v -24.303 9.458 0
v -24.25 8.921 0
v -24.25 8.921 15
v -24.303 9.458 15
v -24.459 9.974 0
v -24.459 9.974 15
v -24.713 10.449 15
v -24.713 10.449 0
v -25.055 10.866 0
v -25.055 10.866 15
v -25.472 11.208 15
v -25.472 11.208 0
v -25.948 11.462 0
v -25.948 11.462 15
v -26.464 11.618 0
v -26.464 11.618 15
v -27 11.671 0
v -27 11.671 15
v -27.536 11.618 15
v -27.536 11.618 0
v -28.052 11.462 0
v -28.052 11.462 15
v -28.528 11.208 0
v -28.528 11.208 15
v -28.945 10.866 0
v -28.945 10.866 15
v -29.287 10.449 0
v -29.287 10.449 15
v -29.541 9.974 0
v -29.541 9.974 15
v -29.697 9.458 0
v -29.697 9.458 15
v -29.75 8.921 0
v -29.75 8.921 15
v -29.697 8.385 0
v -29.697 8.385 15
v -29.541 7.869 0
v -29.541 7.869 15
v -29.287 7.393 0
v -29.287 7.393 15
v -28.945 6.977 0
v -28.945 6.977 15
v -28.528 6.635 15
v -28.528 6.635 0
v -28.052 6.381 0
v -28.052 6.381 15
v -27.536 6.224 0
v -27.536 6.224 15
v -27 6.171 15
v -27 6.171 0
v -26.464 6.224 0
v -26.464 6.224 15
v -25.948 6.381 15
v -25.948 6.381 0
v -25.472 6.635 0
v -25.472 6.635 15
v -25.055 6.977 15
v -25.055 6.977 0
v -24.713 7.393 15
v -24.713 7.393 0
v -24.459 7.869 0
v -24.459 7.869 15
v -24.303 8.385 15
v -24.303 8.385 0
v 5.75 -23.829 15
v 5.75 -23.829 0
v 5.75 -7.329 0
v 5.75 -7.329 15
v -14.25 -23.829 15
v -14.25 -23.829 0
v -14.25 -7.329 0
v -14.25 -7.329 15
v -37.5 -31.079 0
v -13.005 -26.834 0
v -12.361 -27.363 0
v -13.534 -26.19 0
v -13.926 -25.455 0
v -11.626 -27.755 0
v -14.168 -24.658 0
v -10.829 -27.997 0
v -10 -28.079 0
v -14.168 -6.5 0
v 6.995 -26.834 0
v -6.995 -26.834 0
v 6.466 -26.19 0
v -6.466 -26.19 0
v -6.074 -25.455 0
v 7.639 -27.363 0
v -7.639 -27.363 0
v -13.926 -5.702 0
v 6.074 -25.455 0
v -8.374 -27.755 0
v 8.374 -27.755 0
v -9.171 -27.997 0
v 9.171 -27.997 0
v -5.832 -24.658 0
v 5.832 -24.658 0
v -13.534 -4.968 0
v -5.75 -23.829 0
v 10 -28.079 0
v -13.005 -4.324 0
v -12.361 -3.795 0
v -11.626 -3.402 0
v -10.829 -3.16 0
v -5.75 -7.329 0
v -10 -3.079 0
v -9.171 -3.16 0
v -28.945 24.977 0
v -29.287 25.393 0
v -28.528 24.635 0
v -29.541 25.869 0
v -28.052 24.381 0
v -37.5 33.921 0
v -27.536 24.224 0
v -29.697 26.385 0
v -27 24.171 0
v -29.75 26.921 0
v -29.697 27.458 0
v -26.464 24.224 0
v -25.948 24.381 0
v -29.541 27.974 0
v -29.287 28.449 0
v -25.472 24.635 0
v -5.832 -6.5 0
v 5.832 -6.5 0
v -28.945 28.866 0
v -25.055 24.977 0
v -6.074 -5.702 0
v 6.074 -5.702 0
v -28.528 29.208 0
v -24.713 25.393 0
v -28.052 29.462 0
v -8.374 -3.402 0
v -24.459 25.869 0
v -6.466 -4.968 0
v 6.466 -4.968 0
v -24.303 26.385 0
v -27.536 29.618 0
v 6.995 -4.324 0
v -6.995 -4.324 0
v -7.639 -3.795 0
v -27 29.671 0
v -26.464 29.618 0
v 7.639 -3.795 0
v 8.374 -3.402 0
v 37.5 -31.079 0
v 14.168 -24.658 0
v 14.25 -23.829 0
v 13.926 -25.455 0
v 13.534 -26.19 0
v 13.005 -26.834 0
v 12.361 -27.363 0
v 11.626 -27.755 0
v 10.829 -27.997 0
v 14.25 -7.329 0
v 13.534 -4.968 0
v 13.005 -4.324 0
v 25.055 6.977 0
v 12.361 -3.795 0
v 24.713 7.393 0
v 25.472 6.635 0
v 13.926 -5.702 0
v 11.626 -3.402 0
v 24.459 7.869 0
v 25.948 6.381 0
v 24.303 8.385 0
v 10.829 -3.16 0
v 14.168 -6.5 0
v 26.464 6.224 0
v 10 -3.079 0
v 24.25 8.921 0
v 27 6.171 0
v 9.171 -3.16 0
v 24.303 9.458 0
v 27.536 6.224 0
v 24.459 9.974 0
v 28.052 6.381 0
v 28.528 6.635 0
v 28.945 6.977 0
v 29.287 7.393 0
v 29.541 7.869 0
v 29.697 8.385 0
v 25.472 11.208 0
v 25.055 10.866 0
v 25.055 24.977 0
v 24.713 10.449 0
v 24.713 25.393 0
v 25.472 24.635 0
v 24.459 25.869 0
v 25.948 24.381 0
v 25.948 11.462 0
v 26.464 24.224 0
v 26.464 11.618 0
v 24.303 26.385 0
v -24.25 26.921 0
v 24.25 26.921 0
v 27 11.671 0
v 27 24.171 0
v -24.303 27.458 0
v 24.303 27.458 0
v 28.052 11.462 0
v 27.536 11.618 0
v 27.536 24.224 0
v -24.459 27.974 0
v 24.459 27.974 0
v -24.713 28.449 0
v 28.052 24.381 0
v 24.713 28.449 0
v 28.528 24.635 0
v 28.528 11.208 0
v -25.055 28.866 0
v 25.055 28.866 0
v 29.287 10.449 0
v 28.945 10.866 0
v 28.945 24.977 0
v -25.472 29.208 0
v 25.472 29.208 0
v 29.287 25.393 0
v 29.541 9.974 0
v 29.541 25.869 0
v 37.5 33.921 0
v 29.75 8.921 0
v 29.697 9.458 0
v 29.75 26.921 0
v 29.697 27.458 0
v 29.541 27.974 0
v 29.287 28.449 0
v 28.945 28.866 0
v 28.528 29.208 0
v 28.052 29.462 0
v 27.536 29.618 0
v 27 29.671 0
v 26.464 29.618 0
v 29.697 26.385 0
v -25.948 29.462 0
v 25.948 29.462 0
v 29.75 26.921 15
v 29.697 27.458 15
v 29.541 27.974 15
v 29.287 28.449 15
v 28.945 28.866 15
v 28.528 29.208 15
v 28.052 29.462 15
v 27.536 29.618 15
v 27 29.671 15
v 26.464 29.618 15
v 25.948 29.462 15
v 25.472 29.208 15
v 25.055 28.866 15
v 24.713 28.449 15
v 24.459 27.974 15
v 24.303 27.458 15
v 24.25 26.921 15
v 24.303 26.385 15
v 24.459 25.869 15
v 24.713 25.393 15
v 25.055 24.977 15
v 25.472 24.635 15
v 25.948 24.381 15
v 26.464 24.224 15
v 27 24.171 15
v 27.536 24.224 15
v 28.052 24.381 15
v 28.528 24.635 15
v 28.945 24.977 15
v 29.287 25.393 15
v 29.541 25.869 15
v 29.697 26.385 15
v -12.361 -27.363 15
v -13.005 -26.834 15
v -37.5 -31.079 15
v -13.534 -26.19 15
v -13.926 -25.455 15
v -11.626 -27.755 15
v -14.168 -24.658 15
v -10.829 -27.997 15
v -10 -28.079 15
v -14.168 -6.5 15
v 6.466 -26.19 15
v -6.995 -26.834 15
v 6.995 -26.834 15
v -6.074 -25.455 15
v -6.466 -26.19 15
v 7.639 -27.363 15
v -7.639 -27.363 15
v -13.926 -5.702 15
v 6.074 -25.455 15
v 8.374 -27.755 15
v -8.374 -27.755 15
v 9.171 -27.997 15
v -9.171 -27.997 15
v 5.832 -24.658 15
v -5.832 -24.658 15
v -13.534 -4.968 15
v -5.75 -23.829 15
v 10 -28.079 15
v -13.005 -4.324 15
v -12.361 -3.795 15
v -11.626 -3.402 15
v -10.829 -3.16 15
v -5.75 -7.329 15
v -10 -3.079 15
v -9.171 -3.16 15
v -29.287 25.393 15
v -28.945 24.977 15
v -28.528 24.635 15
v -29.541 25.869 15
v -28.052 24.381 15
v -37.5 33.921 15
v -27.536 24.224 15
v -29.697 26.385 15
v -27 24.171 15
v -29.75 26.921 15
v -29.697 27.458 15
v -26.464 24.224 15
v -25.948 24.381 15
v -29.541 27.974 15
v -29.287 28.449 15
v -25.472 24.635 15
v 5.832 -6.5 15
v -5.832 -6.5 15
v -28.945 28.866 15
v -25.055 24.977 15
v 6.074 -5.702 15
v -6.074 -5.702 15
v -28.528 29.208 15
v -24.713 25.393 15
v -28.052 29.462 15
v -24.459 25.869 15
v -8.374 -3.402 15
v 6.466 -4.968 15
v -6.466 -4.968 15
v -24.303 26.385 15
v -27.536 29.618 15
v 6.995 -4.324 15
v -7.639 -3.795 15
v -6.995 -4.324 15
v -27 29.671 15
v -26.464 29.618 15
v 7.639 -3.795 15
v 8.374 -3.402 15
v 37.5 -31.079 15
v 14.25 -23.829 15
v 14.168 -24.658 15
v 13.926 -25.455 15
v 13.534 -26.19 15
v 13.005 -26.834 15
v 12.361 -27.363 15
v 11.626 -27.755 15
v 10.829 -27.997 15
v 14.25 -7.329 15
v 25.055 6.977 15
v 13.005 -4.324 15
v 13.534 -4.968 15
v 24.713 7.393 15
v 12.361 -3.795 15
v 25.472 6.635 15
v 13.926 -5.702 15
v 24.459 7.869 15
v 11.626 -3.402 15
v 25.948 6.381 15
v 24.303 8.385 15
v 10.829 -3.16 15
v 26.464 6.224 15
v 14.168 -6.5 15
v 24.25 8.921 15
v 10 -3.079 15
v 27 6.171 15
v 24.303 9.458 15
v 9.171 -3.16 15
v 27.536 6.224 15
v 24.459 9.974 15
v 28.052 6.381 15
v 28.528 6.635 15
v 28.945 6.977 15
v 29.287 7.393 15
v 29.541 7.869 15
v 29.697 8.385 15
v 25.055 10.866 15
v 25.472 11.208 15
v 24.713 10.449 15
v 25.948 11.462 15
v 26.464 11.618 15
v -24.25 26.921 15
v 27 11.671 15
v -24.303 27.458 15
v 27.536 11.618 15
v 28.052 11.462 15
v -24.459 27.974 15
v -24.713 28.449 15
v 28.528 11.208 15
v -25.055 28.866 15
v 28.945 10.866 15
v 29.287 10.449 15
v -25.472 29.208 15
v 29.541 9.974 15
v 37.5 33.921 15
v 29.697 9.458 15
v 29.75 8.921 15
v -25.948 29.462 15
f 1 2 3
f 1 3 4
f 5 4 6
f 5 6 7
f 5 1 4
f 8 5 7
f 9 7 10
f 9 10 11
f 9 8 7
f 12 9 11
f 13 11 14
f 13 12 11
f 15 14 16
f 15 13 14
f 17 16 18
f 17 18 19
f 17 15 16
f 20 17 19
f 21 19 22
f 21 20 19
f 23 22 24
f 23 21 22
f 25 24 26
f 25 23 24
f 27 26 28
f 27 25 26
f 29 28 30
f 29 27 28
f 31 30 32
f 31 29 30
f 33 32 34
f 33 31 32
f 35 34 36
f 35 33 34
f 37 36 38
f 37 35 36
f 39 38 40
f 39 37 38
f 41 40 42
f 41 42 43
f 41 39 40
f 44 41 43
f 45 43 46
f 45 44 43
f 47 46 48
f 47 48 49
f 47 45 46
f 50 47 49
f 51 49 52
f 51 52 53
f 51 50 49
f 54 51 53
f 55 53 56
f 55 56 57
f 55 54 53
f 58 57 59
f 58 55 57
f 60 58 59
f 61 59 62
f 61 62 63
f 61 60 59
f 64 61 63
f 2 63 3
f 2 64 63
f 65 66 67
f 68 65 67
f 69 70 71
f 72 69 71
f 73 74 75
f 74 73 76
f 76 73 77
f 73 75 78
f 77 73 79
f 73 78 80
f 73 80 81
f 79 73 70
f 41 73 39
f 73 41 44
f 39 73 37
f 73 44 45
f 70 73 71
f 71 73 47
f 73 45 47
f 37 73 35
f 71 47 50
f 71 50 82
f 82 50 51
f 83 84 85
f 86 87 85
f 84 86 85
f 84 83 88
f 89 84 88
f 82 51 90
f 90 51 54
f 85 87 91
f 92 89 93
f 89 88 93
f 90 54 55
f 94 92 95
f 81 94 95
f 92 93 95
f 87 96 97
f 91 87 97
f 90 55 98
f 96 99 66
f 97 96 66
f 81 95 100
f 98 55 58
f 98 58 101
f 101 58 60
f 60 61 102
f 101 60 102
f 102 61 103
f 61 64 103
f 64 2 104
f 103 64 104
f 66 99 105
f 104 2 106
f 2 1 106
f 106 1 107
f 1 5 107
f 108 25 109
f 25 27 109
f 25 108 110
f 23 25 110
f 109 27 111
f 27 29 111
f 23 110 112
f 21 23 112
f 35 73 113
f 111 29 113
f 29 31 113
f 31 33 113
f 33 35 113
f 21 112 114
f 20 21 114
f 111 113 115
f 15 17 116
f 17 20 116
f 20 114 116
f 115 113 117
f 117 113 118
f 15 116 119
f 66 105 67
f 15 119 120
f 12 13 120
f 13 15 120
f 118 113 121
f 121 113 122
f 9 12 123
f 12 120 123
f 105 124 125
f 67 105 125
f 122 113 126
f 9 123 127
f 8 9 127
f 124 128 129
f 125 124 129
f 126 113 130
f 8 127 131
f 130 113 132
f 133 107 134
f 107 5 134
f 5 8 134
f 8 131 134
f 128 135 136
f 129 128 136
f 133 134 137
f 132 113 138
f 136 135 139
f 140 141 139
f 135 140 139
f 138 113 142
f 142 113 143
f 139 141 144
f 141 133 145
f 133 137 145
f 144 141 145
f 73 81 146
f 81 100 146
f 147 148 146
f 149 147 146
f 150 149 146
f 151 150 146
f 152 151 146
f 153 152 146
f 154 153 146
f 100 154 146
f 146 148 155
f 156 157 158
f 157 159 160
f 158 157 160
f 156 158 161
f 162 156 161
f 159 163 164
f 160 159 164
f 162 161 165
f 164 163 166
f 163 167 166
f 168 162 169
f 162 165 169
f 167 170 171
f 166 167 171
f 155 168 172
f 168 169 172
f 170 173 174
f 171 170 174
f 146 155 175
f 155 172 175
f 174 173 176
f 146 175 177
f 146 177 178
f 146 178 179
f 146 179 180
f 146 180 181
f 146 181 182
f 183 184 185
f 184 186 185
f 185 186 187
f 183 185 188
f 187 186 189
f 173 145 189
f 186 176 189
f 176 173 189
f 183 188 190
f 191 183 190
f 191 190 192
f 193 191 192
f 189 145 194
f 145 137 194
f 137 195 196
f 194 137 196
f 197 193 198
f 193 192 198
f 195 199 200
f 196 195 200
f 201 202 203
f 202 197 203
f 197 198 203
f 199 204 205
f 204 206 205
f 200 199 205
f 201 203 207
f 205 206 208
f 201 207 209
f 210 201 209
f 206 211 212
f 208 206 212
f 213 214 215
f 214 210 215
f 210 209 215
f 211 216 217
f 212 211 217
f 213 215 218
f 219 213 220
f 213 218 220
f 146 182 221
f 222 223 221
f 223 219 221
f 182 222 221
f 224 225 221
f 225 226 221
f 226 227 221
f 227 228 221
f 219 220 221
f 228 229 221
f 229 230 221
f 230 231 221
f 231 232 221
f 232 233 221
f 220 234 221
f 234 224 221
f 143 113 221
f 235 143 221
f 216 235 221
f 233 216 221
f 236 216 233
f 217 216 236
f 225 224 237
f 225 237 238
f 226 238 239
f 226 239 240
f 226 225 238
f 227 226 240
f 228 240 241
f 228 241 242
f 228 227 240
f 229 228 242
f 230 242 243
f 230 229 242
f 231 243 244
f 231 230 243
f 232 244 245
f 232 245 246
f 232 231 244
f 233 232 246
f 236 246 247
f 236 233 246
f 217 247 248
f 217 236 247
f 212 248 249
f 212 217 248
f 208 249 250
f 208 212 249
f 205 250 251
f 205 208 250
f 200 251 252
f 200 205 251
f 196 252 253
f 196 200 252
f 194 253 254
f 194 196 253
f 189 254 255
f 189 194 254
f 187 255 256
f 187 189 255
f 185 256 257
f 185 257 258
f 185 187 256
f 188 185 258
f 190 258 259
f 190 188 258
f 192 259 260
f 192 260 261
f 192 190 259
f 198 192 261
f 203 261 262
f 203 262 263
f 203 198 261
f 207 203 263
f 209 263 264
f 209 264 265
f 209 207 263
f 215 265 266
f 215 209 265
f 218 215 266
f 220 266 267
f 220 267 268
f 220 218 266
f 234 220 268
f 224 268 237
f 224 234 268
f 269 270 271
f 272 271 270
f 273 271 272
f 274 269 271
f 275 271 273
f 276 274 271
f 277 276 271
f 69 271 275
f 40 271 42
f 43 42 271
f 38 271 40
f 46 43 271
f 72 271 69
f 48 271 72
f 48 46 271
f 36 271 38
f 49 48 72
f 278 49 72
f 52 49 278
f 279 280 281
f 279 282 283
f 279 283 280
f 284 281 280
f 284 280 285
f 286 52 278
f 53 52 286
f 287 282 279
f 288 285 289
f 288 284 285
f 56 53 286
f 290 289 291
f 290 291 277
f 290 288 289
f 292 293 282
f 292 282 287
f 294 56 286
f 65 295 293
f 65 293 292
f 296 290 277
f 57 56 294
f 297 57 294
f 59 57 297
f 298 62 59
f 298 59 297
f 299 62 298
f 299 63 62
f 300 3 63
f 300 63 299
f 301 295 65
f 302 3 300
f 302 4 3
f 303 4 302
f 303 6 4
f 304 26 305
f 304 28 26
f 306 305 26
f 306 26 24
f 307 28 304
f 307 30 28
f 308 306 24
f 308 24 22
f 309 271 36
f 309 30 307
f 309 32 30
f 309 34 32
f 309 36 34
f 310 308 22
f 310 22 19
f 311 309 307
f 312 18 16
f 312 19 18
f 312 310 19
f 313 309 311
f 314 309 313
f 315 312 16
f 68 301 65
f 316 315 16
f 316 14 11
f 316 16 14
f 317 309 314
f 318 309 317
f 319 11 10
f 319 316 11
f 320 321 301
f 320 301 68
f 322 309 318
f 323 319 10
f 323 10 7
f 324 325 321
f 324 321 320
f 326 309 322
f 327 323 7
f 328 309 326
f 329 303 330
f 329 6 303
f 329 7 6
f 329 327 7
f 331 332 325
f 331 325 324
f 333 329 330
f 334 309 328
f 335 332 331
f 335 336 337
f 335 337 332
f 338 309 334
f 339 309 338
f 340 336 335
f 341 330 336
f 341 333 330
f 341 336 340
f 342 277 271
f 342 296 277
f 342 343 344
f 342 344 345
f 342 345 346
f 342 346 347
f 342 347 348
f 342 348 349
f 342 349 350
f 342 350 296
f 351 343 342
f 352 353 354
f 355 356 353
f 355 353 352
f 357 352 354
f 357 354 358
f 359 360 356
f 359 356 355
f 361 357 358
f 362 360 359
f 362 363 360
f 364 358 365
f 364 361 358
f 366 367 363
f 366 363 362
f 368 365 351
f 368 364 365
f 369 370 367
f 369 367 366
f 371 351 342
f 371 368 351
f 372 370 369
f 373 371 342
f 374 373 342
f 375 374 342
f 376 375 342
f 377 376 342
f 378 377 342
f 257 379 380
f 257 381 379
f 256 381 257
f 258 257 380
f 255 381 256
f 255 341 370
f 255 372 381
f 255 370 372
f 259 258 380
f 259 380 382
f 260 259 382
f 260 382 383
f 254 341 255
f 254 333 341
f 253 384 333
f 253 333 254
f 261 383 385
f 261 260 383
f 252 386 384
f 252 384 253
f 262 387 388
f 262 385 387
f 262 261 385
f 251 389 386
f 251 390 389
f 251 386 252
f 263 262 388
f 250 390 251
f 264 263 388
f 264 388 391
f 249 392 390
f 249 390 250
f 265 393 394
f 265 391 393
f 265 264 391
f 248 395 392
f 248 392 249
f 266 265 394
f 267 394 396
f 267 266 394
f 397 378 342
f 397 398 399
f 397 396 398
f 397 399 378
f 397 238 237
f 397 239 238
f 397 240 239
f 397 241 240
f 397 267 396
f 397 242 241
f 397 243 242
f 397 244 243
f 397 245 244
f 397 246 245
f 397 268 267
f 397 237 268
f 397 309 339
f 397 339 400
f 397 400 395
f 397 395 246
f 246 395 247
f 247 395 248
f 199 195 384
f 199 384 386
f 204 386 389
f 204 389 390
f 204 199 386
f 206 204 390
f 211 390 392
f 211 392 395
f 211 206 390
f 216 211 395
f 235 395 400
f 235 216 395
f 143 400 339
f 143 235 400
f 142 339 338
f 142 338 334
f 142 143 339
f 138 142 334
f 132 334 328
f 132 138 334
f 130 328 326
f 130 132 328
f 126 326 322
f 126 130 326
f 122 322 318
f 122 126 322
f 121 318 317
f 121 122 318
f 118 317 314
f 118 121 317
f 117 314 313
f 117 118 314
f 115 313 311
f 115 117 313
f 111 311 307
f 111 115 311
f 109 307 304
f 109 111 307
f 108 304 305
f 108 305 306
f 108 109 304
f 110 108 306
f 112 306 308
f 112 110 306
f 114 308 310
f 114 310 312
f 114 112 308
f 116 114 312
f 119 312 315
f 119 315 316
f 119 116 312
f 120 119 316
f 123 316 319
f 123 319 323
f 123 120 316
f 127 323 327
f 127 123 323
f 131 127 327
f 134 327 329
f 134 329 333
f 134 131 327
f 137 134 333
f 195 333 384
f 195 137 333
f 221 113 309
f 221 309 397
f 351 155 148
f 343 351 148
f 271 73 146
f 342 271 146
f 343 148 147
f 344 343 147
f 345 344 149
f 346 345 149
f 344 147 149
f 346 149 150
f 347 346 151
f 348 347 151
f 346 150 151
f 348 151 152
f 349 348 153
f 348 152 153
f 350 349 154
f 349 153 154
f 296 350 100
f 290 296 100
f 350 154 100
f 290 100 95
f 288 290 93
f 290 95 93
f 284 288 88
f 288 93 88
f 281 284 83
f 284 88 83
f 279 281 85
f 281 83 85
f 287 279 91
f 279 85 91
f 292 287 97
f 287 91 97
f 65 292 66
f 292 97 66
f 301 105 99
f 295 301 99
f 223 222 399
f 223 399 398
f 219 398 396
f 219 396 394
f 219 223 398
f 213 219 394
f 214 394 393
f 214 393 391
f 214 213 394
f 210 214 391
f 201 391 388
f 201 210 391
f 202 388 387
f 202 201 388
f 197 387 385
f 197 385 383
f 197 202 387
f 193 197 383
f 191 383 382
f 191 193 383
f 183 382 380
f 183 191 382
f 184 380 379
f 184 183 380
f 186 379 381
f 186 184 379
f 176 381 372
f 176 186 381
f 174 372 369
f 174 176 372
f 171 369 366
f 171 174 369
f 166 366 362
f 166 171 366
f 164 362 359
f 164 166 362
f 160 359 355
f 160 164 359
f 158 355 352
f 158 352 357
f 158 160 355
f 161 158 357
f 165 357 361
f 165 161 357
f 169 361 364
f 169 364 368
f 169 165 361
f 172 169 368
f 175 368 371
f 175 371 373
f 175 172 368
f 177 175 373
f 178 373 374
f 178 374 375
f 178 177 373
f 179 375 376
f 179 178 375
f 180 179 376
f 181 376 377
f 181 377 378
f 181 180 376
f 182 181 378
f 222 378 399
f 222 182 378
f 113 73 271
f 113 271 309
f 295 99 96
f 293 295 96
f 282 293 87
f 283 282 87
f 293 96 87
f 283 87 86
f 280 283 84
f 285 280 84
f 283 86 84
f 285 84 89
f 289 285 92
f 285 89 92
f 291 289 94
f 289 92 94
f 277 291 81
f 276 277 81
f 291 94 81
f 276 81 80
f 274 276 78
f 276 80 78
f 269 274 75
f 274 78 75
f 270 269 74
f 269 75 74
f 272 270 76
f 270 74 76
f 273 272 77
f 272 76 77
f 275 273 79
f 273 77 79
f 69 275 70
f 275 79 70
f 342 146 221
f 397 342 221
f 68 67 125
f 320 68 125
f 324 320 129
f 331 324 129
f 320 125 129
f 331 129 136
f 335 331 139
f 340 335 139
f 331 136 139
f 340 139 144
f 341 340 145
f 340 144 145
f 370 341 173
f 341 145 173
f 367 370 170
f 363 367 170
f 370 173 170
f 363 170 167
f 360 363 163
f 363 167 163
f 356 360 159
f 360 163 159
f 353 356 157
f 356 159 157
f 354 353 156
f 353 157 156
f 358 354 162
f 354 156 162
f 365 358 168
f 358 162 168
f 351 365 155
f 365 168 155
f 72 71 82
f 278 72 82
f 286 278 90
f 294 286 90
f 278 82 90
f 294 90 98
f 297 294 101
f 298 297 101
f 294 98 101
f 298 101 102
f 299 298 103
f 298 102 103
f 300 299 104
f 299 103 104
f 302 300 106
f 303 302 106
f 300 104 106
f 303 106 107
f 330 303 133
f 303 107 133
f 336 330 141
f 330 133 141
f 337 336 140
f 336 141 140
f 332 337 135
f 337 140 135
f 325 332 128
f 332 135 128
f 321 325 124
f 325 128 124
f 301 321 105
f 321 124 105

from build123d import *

# Parameters (mm, degrees)
SKETCH1_W           = 75
SKETCH1_H           = 65
SKETCH1_R           = 2.75
BOSS_EXTRUDE1_DEPTH = 15


with BuildPart() as part:
    # Sketch1 → Boss-Extrude1 (new body)
    with BuildSketch(Plane.XY):
        with Locations((0, 1.421243981)):
            Rectangle(SKETCH1_W, SKETCH1_H)
        with Locations((-27, 8.921243981)):
            Circle(SKETCH1_R, mode=Mode.SUBTRACT)
        with Locations((-27, 26.921243981)):
            Circle(SKETCH1_R, mode=Mode.SUBTRACT)
        with Locations((27, 26.921243981)):
            Circle(SKETCH1_R, mode=Mode.SUBTRACT)
        with Locations((27, 8.921243981)):
            Circle(SKETCH1_R, mode=Mode.SUBTRACT)
        with BuildLine():
            Line((-5.75, -7.328756019), (-5.75, -23.828756019))
            ThreePointArc((-5.75, -23.828756019), (-10, -28.078756019), (-14.25, -23.828756019))
            Line((-14.25, -23.828756019), (-14.25, -7.328756019))
            ThreePointArc((-14.25, -7.328756019), (-10, -3.078756019), (-5.75, -7.328756019))
        make_face(mode=Mode.SUBTRACT)
        with BuildLine():
            Line((14.25, -7.328756019), (14.25, -23.828756019))
            ThreePointArc((14.25, -23.828756019), (10, -28.078756019), (5.75, -23.828756019))
            Line((5.75, -23.828756019), (5.75, -7.328756019))
            ThreePointArc((5.75, -7.328756019), (10, -3.078756019), (14.25, -7.328756019))
        make_face(mode=Mode.SUBTRACT)
    extrude(amount=BOSS_EXTRUDE1_DEPTH)


solid = part.part
